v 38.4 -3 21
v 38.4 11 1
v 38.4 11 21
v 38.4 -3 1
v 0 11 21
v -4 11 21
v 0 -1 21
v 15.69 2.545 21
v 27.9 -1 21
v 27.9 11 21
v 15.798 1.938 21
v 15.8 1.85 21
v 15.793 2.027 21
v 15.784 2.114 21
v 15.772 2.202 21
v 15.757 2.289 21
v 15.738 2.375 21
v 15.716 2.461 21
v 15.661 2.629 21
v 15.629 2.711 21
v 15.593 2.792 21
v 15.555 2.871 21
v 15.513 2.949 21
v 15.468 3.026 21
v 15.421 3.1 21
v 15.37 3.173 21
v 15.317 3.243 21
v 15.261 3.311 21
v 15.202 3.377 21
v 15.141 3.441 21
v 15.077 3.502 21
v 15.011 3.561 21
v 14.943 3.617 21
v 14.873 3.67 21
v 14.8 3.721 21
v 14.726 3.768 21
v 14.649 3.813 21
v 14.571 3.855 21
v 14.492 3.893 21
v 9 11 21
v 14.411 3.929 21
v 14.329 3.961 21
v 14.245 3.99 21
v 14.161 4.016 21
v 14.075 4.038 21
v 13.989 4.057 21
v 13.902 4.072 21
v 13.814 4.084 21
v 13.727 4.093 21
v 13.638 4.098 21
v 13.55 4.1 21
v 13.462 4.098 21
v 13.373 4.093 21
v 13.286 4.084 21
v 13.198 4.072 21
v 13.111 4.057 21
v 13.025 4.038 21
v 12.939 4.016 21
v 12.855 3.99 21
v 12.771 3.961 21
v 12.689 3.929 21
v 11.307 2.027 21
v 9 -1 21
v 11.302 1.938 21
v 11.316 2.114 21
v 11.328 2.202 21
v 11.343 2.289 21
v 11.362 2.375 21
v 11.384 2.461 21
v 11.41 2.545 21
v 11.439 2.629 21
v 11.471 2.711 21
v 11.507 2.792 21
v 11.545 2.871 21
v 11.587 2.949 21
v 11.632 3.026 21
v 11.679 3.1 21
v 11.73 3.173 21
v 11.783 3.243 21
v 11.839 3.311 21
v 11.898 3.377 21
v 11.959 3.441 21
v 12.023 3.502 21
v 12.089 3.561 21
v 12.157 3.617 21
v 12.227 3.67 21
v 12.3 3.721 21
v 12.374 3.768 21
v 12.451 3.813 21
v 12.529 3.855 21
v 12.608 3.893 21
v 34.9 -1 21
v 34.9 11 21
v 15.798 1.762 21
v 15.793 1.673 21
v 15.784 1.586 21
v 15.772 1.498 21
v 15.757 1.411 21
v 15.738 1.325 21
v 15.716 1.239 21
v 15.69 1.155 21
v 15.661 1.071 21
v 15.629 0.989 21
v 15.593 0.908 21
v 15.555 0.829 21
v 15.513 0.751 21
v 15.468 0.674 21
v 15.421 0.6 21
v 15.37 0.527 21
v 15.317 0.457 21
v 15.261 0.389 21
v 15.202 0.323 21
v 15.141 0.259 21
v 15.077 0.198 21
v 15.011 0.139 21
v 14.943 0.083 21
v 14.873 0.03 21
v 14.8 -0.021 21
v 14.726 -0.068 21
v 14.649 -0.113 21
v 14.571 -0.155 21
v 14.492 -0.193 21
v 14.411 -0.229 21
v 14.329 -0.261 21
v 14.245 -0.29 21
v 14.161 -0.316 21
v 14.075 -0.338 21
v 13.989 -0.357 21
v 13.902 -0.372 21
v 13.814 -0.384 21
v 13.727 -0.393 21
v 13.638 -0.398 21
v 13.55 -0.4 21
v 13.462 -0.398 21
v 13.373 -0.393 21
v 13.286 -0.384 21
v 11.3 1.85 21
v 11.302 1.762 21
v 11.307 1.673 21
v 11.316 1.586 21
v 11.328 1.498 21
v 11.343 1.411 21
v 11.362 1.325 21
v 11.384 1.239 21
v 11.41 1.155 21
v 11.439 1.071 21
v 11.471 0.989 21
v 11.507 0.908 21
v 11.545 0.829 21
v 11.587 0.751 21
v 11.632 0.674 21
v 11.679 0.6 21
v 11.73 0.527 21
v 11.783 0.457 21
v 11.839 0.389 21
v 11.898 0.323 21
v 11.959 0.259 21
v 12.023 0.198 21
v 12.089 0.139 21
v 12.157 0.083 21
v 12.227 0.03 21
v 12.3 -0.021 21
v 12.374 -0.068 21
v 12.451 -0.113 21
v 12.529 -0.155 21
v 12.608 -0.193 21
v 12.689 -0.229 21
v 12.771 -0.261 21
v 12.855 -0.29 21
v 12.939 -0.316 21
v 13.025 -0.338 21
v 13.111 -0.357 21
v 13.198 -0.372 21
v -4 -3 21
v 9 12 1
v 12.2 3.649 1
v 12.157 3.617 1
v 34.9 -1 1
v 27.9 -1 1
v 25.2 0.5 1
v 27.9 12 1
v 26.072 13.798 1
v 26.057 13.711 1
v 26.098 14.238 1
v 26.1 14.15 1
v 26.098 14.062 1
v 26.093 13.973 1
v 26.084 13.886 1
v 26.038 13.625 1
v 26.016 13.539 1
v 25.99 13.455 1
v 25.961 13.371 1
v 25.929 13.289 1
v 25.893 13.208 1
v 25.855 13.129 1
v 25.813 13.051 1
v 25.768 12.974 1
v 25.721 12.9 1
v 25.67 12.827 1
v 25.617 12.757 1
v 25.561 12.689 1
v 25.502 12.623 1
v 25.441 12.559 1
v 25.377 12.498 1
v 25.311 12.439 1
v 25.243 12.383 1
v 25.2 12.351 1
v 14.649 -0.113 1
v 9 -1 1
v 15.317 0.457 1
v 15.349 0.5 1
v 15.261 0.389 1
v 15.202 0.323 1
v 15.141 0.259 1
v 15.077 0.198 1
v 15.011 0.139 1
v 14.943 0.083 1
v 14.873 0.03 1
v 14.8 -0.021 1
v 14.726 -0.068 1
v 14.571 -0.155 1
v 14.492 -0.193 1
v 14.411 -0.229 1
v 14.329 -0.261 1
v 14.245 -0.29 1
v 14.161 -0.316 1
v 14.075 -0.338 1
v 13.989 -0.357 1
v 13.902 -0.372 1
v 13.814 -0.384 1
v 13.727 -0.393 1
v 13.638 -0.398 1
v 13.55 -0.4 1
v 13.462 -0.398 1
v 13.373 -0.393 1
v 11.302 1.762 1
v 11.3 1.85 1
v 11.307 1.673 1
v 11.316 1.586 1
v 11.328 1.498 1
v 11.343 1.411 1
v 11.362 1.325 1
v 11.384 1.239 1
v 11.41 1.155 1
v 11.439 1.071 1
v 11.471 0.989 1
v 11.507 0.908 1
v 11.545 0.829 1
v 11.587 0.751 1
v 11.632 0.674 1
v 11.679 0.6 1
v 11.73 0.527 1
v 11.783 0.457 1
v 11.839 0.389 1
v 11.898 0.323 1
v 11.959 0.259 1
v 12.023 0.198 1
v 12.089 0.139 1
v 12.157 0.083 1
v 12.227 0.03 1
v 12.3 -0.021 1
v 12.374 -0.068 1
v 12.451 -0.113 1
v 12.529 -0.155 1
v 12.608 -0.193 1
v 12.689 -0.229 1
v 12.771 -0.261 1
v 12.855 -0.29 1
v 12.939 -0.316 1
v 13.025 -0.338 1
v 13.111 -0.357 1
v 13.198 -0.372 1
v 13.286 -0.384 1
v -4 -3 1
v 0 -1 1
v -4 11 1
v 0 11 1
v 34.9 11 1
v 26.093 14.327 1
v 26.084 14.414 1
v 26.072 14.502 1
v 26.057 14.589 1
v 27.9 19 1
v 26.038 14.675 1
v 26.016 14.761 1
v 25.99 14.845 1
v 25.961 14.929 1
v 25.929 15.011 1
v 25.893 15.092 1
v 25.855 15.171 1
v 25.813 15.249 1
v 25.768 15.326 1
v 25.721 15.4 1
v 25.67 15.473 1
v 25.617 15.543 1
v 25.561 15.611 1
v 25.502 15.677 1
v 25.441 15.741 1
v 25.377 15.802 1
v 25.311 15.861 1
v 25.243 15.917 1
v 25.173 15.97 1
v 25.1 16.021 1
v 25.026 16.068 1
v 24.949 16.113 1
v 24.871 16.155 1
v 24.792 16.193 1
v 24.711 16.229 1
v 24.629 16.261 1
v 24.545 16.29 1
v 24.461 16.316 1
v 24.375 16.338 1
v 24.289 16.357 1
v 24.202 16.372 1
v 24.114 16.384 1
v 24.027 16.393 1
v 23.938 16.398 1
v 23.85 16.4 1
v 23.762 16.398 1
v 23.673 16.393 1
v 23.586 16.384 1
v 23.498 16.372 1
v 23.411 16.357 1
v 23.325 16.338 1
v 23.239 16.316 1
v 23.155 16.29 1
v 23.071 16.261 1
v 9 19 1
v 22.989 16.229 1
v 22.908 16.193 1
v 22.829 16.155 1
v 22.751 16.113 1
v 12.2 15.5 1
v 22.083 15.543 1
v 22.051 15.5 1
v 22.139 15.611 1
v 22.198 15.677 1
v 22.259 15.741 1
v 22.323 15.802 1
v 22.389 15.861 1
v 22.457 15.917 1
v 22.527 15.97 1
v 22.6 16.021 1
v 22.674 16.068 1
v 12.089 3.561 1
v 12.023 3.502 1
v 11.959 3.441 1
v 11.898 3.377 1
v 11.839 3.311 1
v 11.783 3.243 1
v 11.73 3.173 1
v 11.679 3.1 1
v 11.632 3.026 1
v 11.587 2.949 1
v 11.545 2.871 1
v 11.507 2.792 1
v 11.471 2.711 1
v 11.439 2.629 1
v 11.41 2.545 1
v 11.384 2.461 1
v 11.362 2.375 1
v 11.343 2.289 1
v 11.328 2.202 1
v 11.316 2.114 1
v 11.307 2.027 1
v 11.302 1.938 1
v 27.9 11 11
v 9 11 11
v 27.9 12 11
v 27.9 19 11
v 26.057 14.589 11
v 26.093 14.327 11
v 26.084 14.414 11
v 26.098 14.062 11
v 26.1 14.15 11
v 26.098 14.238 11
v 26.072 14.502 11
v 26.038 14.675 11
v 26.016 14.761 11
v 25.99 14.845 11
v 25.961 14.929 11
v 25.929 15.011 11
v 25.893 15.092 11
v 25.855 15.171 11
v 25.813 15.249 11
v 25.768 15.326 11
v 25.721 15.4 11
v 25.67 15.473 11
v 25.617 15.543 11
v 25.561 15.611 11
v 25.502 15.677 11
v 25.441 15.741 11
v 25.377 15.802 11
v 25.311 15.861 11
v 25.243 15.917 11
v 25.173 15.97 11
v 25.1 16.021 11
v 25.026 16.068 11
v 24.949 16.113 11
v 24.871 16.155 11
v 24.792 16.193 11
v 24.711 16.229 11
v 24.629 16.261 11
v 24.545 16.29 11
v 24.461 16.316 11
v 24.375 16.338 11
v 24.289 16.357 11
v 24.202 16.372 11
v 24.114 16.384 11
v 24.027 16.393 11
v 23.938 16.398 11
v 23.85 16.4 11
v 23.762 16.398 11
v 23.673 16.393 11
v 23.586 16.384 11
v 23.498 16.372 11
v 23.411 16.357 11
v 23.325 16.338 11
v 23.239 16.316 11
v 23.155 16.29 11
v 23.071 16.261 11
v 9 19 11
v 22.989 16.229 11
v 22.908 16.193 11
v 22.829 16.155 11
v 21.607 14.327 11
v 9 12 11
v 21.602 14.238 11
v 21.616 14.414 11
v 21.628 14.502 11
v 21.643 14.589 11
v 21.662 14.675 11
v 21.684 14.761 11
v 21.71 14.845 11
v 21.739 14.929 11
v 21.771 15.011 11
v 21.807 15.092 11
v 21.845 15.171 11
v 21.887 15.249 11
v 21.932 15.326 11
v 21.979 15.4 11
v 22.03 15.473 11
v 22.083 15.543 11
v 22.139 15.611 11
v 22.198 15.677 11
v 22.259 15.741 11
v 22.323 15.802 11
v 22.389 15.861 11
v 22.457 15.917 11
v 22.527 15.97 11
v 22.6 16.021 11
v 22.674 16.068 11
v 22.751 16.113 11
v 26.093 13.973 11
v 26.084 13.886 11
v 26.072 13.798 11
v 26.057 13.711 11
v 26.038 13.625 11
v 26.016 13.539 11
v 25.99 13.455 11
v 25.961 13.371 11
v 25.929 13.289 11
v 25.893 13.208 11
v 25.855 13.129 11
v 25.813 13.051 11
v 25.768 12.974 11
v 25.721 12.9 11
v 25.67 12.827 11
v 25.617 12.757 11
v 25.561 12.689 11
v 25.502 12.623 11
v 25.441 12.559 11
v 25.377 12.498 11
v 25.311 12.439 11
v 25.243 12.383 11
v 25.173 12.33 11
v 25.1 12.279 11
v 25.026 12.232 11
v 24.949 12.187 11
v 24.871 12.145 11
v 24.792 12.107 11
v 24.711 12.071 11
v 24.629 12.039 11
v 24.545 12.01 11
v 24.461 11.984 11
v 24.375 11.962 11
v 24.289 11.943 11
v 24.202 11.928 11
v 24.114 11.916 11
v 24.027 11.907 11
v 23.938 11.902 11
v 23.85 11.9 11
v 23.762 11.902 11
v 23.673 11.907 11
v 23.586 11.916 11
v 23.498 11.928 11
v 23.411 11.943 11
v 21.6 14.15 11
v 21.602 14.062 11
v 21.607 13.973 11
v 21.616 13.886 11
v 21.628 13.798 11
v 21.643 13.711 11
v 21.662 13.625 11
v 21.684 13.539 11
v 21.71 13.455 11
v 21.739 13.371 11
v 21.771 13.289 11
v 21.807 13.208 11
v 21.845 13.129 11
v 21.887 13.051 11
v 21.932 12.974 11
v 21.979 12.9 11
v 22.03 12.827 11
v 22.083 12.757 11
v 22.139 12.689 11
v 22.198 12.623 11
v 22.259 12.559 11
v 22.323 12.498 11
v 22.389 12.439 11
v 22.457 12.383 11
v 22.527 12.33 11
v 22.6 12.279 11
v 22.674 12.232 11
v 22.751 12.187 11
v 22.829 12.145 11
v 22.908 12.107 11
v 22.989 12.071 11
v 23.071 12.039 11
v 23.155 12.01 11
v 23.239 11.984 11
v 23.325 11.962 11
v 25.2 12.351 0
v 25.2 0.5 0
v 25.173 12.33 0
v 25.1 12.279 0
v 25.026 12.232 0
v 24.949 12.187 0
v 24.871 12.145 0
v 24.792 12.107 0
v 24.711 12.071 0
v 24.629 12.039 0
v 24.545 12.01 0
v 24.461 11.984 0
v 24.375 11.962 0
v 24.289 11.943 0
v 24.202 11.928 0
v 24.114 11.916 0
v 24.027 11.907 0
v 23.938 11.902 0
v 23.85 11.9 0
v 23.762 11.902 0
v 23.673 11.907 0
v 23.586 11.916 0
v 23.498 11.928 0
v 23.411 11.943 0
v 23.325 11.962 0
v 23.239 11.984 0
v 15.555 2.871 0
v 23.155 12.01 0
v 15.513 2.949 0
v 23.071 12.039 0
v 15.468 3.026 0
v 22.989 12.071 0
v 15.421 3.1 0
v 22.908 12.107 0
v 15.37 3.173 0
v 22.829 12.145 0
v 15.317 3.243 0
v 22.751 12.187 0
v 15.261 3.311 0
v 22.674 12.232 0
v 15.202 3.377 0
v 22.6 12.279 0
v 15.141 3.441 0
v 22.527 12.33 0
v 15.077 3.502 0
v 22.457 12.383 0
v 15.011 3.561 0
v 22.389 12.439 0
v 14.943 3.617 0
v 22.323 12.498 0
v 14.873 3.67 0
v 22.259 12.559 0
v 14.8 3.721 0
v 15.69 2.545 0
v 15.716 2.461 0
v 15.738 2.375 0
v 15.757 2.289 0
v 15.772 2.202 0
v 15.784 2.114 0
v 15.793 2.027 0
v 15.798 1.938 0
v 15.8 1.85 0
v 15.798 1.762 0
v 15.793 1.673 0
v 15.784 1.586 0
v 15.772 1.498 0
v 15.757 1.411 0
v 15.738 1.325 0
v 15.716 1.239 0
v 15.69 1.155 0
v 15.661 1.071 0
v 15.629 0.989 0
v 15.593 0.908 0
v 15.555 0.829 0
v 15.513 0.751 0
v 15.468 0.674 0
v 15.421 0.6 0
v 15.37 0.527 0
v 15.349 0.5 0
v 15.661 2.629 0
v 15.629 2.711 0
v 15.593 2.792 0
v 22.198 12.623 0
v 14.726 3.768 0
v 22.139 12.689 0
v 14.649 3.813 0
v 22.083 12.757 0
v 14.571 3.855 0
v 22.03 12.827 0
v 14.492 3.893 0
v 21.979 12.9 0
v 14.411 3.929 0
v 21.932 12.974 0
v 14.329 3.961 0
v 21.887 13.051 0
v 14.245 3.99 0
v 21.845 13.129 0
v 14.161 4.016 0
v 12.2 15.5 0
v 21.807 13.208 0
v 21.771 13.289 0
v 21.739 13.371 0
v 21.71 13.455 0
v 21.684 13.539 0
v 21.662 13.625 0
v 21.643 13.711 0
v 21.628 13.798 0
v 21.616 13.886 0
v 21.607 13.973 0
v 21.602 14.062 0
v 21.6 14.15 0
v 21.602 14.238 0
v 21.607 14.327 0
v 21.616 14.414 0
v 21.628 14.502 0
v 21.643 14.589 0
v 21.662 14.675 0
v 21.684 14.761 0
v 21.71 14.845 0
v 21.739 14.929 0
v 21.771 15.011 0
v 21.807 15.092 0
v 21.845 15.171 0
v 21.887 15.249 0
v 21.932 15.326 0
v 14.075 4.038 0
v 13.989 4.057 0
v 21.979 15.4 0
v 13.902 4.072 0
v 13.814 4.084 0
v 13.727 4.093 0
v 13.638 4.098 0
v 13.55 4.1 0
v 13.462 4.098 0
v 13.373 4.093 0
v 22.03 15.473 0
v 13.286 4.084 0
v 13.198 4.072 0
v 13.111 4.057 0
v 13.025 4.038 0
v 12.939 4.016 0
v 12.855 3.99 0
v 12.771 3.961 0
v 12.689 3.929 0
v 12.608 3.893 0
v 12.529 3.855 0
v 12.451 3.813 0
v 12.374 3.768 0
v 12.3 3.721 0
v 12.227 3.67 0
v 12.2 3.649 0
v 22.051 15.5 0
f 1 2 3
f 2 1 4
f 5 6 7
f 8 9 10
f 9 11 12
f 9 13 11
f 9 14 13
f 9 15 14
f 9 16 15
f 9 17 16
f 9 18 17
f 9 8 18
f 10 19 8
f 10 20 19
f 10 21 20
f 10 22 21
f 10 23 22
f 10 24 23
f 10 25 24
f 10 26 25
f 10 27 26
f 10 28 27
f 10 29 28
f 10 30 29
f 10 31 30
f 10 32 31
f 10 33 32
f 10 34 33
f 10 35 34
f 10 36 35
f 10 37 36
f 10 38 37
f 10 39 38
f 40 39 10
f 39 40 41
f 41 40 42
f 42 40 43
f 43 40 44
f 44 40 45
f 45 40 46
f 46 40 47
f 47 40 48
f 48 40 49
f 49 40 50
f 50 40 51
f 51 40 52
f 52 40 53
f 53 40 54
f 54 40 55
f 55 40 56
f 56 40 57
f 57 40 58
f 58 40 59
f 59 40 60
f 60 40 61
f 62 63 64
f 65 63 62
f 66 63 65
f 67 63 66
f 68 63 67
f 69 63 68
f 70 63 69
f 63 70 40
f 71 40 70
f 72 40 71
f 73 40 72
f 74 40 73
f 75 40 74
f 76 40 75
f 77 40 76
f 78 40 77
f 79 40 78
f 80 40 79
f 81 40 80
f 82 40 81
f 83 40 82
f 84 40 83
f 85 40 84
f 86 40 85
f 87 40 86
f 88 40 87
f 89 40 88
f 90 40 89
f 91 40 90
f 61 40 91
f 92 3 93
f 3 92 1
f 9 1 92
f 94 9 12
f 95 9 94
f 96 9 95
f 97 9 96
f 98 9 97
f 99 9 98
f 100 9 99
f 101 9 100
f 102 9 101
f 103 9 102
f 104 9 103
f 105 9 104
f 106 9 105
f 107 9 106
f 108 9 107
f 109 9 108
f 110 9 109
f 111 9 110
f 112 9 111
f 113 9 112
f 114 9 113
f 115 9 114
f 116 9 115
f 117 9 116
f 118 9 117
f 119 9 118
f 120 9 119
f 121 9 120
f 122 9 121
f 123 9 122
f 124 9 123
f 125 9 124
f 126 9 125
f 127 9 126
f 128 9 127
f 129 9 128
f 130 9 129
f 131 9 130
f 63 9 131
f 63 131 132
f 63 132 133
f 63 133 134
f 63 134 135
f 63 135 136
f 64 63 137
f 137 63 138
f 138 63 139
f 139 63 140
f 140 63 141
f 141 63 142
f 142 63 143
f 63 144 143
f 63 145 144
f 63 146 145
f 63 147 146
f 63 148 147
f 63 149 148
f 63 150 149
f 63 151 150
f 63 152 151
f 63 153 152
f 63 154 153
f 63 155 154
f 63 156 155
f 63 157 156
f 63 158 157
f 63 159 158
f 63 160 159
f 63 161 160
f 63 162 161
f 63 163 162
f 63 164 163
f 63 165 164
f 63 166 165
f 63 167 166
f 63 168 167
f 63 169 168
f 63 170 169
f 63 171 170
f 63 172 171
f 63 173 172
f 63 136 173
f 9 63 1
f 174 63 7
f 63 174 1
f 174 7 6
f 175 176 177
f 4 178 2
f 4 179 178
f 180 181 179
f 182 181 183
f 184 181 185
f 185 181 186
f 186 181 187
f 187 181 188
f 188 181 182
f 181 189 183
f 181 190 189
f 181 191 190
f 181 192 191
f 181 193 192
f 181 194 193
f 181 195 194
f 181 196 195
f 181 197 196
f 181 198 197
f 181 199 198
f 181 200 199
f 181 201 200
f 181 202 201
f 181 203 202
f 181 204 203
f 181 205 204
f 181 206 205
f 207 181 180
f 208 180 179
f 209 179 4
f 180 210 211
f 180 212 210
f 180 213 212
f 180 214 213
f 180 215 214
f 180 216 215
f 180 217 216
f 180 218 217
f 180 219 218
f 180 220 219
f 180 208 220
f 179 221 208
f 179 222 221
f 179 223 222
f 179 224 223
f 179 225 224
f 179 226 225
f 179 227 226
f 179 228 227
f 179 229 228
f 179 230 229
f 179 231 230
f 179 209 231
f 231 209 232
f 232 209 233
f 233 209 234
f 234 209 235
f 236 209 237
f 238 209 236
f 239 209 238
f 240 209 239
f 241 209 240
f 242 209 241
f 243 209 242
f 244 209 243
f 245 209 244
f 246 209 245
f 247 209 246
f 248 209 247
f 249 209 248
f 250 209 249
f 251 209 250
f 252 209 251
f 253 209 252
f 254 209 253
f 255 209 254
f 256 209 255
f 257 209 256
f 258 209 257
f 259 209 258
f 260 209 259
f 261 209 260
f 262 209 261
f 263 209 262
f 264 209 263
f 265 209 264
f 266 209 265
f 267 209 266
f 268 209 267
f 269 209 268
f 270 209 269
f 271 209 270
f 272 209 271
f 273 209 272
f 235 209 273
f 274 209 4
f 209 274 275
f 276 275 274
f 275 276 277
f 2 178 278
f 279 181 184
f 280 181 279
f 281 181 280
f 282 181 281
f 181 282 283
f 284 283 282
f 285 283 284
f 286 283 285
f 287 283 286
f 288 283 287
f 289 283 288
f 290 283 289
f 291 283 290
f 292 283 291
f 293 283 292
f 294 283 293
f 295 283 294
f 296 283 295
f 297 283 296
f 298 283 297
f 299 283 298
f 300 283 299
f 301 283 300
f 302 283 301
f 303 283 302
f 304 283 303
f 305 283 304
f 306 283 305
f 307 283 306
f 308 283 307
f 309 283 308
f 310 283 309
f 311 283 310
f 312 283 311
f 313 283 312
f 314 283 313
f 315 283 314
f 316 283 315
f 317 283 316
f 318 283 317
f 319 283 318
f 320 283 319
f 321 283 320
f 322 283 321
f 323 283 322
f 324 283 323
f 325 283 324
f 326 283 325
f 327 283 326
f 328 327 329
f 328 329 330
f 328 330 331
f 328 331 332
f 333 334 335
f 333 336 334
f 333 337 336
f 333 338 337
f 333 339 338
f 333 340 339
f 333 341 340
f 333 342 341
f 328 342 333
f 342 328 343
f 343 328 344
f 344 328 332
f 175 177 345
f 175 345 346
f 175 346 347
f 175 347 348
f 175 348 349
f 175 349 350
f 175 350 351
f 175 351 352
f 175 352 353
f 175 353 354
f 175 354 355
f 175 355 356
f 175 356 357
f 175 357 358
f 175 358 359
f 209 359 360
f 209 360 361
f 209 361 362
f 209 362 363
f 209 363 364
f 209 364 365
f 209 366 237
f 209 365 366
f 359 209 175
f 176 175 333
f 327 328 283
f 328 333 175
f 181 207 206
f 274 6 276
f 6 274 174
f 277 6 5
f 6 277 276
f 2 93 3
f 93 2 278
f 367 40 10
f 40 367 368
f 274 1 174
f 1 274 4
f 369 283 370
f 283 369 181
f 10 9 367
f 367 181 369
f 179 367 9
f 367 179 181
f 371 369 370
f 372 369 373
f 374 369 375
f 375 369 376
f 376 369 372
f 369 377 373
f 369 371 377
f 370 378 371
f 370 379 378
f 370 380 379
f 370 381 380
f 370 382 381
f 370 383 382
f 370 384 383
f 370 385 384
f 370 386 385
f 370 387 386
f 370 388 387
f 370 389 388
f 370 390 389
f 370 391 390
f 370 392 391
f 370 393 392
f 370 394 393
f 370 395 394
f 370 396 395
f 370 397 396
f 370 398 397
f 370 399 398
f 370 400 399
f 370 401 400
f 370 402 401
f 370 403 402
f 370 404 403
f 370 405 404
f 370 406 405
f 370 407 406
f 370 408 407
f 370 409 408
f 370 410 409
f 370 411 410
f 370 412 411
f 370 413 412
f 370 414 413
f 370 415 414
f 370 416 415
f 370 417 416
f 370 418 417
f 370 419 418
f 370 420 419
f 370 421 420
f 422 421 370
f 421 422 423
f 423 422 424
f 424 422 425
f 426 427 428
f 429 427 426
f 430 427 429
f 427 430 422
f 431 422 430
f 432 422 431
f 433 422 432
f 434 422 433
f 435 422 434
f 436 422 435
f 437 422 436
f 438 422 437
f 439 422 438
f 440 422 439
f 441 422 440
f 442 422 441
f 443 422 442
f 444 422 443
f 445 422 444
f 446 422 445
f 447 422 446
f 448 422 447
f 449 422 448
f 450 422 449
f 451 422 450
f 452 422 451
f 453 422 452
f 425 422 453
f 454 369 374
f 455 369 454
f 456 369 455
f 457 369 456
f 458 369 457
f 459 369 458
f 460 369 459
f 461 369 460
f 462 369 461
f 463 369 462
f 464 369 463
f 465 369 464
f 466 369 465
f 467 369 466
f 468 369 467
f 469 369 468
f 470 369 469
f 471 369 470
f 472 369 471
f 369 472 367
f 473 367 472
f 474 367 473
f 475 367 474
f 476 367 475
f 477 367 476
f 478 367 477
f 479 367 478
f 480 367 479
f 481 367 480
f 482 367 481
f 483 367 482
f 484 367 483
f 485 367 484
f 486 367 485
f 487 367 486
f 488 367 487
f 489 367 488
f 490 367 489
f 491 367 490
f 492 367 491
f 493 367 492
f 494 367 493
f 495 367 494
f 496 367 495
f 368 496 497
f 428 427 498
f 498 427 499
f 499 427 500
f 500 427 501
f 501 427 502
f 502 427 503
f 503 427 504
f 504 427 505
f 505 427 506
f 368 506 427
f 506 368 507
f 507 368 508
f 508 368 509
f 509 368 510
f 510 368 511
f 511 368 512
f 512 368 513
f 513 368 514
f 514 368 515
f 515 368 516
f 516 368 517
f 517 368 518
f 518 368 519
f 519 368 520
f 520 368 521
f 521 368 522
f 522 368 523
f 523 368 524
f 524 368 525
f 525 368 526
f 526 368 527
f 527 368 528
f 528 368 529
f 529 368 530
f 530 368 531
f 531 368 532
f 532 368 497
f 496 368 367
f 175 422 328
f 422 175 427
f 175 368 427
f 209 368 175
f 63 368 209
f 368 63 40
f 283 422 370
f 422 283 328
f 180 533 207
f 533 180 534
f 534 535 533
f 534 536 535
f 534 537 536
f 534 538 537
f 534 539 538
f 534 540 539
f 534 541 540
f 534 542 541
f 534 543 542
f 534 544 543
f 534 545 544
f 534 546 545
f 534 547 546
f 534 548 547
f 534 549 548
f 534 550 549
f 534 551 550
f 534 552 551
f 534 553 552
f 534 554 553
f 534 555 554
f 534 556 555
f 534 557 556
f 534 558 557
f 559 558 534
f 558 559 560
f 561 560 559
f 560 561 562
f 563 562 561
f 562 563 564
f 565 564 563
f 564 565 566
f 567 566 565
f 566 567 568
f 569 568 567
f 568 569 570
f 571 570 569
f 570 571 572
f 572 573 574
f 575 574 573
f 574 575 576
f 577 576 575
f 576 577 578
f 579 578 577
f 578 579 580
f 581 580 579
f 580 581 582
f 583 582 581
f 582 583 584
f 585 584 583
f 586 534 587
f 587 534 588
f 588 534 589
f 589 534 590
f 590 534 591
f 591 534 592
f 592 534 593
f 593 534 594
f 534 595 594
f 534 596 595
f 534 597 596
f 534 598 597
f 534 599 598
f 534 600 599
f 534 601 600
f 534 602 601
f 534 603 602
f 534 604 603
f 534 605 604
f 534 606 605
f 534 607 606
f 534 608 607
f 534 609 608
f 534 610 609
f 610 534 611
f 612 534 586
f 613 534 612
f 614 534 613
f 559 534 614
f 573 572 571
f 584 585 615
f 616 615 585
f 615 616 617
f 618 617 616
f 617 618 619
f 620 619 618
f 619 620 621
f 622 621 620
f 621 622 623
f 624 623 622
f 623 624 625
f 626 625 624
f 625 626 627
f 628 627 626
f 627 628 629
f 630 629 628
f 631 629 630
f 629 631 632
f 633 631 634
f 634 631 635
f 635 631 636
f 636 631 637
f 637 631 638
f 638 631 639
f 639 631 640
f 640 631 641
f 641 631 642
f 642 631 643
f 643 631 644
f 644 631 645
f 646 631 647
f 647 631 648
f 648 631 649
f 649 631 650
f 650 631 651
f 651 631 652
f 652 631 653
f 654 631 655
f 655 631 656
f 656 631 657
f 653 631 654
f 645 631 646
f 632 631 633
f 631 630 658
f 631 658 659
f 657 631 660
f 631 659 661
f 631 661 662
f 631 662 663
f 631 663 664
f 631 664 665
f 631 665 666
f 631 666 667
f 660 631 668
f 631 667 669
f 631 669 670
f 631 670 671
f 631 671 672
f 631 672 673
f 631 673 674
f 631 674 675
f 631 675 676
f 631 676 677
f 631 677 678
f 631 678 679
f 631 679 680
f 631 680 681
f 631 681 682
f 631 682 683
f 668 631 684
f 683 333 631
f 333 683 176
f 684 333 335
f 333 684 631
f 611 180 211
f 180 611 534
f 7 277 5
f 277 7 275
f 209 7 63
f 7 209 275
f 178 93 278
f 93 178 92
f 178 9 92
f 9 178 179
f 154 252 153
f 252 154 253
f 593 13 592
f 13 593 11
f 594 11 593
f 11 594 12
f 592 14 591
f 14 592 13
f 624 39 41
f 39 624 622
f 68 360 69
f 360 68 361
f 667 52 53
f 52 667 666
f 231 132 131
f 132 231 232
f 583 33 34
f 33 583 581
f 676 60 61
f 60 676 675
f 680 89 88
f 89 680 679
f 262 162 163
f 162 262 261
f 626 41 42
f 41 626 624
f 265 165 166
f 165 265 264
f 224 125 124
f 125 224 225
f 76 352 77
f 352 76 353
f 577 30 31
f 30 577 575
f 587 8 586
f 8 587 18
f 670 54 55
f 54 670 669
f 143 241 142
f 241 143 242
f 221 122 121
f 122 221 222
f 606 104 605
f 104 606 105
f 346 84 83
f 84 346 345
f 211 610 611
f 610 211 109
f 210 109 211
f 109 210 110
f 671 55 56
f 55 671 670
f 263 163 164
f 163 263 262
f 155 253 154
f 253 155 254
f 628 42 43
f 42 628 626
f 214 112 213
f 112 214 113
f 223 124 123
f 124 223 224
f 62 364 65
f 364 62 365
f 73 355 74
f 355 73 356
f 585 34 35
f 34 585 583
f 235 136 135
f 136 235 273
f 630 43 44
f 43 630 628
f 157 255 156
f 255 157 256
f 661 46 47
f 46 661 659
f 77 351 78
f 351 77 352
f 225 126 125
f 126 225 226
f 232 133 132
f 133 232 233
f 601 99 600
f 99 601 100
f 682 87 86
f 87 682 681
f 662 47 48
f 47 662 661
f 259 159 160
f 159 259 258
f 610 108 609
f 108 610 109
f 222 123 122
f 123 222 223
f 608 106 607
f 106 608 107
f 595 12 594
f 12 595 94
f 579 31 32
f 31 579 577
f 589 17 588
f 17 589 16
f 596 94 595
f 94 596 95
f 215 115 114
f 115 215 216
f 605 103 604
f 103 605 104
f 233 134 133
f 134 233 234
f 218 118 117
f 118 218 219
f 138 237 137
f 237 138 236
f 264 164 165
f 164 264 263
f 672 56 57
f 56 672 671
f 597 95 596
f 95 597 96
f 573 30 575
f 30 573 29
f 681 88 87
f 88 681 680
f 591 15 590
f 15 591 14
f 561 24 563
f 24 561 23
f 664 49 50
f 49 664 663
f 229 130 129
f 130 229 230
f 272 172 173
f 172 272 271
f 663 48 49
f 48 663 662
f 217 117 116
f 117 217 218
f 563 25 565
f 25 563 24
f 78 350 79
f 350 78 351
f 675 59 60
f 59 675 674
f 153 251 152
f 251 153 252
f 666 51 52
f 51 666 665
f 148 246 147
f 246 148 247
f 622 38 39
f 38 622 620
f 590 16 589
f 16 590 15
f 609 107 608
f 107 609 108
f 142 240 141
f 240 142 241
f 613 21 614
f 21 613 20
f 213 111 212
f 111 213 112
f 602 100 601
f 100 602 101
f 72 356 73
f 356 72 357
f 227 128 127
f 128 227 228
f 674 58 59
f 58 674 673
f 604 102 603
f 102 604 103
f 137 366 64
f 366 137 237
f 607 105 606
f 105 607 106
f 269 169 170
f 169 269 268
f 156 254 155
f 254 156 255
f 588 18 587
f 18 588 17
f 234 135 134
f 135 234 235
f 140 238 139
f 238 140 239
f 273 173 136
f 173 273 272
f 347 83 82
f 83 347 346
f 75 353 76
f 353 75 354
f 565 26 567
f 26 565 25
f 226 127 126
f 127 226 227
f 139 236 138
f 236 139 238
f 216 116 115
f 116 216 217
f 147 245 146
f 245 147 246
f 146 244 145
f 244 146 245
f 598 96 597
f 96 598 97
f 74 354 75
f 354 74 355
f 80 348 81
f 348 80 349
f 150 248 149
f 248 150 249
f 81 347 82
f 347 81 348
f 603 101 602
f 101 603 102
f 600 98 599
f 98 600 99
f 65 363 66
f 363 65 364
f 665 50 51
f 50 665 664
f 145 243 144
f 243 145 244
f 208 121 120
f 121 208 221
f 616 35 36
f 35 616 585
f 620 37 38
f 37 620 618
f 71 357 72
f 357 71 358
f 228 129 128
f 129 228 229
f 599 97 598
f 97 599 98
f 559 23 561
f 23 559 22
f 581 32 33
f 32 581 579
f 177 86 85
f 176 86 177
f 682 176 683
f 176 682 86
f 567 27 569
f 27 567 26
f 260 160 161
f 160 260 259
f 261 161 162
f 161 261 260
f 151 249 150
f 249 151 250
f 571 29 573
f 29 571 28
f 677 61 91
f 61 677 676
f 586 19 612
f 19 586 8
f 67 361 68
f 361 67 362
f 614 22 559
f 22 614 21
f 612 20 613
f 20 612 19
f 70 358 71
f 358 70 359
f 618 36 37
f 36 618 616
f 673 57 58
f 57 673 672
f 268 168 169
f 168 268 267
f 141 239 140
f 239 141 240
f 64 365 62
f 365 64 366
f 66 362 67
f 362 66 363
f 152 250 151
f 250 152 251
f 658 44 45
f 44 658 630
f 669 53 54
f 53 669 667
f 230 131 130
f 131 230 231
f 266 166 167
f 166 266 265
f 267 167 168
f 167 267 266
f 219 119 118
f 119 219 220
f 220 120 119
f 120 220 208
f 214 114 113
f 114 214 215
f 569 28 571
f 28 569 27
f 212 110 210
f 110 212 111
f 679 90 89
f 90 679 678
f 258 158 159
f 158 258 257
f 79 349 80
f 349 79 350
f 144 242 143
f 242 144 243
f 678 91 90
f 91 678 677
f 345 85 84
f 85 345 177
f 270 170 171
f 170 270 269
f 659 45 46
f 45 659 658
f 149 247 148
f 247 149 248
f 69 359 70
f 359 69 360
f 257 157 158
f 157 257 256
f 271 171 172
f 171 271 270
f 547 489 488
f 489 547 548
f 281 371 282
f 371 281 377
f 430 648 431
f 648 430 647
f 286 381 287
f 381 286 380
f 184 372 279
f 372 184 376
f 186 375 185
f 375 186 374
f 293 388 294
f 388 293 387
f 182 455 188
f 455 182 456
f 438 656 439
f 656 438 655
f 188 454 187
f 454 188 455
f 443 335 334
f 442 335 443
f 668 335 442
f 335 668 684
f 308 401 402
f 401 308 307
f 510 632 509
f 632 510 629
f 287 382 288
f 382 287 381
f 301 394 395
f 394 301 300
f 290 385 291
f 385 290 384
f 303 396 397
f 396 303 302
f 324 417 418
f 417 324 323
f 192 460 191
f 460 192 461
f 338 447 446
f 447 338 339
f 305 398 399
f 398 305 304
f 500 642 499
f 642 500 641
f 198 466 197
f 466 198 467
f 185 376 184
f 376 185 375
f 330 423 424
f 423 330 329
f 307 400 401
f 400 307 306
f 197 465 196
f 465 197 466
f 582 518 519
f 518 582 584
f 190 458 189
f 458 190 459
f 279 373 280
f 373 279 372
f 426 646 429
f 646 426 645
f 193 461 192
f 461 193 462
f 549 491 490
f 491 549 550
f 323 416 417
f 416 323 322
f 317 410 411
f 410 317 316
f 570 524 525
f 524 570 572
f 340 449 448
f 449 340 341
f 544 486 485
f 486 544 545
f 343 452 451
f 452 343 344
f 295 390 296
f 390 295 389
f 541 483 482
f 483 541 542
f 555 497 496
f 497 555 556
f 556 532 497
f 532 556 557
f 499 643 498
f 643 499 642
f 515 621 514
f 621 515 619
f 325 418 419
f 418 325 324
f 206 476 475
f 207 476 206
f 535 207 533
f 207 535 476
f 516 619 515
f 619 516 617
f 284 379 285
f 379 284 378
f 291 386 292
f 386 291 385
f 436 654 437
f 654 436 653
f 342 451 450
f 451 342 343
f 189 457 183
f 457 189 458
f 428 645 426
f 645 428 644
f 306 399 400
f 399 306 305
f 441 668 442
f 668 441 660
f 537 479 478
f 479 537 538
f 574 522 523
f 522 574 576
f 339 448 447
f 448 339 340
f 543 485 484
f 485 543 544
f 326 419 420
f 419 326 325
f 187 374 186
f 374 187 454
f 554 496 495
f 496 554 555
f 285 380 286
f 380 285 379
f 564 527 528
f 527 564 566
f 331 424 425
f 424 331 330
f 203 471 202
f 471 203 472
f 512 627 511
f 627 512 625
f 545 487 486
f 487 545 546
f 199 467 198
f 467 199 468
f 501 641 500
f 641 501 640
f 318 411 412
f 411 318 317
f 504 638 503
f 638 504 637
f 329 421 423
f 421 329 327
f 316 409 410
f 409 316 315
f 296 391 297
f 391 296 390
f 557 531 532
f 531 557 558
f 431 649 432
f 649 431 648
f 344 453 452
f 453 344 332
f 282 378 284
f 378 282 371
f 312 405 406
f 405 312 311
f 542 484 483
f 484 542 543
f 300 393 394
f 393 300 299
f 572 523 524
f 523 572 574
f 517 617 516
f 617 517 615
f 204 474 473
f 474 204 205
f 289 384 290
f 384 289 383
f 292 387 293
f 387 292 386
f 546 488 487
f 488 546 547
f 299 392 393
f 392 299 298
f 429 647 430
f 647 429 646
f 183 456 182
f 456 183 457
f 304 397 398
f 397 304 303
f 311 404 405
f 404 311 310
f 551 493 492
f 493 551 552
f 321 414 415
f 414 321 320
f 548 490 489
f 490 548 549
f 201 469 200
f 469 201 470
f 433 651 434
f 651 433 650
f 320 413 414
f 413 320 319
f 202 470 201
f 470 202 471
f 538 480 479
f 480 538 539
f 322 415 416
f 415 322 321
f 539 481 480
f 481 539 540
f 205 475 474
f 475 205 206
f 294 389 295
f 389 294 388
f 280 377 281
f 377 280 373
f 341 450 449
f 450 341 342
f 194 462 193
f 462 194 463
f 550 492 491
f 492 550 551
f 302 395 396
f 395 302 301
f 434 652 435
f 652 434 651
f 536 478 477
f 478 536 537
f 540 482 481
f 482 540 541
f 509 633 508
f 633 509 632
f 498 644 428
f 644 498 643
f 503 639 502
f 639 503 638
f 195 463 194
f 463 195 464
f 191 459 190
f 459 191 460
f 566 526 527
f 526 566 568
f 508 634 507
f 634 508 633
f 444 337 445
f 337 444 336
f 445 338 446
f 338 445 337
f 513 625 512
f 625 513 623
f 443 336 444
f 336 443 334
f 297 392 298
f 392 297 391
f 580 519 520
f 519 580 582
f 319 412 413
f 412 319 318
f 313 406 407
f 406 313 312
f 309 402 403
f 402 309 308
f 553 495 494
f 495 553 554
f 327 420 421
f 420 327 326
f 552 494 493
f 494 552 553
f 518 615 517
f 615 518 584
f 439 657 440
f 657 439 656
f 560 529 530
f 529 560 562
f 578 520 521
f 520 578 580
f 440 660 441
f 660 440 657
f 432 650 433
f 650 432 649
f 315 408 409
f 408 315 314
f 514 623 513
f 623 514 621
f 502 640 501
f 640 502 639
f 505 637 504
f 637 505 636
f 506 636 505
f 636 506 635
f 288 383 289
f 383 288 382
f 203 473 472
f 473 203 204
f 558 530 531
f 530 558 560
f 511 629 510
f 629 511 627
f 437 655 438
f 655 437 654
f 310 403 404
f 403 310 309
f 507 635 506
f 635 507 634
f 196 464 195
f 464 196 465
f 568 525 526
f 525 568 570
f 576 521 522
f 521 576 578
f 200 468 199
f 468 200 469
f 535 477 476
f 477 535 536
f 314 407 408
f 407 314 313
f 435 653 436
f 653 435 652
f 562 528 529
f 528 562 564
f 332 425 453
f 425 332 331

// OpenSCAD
$fn=160;
alimX=9;
alimY=11;

espacementGuideAlim=3.2;//2.8;

guideX=13;
guideY=15;

espacementGuideJack=3.2;//2.8;

sortieJack=6;

threadSize=2.7;
threadInsert=4.5;

//cube([alimX, alimY, 3]);

//translate([alimX+espacementGuideAlim,0.5,0])
//cube([guideX, guideY, 3]);

//translate([alimX+espacementGuideAlim+guideX+espacementGuideJack+sortieJack/2,sortieJack/2,0])
//cylinder(h=3, d=sortieJack);

difference(){
    union(){
        translate([-4,-3,1])
        cube([alimX+espacementGuideAlim+guideX+espacementGuideJack+sortieJack+8,alimY+3,20]);
        
        translate([alimX, alimY, 1])
        cube([18.9,8,10]);

        translate([alimX+espacementGuideAlim,0.5,0])
        cube([guideX, guideY, 3]);
    }
    translate([0,-1,0])
    cube([alimX, alimY+2, 25]);
    
    
translate([alimX+espacementGuideAlim+guideX+espacementGuideJack
    -(7-sortieJack)/2,-1,0])
    cube([7,alimY+2,25]);
    
    translate([alimX+espacementGuideAlim+threadSize/2,threadSize/2+0.5,-1])
    cylinder(h=100, d=threadInsert);

    translate([alimX+espacementGuideAlim-threadSize/2+guideX,-threadSize/2+guideY+0.5,-1])
    cylinder(h=100, d=threadInsert);

}
